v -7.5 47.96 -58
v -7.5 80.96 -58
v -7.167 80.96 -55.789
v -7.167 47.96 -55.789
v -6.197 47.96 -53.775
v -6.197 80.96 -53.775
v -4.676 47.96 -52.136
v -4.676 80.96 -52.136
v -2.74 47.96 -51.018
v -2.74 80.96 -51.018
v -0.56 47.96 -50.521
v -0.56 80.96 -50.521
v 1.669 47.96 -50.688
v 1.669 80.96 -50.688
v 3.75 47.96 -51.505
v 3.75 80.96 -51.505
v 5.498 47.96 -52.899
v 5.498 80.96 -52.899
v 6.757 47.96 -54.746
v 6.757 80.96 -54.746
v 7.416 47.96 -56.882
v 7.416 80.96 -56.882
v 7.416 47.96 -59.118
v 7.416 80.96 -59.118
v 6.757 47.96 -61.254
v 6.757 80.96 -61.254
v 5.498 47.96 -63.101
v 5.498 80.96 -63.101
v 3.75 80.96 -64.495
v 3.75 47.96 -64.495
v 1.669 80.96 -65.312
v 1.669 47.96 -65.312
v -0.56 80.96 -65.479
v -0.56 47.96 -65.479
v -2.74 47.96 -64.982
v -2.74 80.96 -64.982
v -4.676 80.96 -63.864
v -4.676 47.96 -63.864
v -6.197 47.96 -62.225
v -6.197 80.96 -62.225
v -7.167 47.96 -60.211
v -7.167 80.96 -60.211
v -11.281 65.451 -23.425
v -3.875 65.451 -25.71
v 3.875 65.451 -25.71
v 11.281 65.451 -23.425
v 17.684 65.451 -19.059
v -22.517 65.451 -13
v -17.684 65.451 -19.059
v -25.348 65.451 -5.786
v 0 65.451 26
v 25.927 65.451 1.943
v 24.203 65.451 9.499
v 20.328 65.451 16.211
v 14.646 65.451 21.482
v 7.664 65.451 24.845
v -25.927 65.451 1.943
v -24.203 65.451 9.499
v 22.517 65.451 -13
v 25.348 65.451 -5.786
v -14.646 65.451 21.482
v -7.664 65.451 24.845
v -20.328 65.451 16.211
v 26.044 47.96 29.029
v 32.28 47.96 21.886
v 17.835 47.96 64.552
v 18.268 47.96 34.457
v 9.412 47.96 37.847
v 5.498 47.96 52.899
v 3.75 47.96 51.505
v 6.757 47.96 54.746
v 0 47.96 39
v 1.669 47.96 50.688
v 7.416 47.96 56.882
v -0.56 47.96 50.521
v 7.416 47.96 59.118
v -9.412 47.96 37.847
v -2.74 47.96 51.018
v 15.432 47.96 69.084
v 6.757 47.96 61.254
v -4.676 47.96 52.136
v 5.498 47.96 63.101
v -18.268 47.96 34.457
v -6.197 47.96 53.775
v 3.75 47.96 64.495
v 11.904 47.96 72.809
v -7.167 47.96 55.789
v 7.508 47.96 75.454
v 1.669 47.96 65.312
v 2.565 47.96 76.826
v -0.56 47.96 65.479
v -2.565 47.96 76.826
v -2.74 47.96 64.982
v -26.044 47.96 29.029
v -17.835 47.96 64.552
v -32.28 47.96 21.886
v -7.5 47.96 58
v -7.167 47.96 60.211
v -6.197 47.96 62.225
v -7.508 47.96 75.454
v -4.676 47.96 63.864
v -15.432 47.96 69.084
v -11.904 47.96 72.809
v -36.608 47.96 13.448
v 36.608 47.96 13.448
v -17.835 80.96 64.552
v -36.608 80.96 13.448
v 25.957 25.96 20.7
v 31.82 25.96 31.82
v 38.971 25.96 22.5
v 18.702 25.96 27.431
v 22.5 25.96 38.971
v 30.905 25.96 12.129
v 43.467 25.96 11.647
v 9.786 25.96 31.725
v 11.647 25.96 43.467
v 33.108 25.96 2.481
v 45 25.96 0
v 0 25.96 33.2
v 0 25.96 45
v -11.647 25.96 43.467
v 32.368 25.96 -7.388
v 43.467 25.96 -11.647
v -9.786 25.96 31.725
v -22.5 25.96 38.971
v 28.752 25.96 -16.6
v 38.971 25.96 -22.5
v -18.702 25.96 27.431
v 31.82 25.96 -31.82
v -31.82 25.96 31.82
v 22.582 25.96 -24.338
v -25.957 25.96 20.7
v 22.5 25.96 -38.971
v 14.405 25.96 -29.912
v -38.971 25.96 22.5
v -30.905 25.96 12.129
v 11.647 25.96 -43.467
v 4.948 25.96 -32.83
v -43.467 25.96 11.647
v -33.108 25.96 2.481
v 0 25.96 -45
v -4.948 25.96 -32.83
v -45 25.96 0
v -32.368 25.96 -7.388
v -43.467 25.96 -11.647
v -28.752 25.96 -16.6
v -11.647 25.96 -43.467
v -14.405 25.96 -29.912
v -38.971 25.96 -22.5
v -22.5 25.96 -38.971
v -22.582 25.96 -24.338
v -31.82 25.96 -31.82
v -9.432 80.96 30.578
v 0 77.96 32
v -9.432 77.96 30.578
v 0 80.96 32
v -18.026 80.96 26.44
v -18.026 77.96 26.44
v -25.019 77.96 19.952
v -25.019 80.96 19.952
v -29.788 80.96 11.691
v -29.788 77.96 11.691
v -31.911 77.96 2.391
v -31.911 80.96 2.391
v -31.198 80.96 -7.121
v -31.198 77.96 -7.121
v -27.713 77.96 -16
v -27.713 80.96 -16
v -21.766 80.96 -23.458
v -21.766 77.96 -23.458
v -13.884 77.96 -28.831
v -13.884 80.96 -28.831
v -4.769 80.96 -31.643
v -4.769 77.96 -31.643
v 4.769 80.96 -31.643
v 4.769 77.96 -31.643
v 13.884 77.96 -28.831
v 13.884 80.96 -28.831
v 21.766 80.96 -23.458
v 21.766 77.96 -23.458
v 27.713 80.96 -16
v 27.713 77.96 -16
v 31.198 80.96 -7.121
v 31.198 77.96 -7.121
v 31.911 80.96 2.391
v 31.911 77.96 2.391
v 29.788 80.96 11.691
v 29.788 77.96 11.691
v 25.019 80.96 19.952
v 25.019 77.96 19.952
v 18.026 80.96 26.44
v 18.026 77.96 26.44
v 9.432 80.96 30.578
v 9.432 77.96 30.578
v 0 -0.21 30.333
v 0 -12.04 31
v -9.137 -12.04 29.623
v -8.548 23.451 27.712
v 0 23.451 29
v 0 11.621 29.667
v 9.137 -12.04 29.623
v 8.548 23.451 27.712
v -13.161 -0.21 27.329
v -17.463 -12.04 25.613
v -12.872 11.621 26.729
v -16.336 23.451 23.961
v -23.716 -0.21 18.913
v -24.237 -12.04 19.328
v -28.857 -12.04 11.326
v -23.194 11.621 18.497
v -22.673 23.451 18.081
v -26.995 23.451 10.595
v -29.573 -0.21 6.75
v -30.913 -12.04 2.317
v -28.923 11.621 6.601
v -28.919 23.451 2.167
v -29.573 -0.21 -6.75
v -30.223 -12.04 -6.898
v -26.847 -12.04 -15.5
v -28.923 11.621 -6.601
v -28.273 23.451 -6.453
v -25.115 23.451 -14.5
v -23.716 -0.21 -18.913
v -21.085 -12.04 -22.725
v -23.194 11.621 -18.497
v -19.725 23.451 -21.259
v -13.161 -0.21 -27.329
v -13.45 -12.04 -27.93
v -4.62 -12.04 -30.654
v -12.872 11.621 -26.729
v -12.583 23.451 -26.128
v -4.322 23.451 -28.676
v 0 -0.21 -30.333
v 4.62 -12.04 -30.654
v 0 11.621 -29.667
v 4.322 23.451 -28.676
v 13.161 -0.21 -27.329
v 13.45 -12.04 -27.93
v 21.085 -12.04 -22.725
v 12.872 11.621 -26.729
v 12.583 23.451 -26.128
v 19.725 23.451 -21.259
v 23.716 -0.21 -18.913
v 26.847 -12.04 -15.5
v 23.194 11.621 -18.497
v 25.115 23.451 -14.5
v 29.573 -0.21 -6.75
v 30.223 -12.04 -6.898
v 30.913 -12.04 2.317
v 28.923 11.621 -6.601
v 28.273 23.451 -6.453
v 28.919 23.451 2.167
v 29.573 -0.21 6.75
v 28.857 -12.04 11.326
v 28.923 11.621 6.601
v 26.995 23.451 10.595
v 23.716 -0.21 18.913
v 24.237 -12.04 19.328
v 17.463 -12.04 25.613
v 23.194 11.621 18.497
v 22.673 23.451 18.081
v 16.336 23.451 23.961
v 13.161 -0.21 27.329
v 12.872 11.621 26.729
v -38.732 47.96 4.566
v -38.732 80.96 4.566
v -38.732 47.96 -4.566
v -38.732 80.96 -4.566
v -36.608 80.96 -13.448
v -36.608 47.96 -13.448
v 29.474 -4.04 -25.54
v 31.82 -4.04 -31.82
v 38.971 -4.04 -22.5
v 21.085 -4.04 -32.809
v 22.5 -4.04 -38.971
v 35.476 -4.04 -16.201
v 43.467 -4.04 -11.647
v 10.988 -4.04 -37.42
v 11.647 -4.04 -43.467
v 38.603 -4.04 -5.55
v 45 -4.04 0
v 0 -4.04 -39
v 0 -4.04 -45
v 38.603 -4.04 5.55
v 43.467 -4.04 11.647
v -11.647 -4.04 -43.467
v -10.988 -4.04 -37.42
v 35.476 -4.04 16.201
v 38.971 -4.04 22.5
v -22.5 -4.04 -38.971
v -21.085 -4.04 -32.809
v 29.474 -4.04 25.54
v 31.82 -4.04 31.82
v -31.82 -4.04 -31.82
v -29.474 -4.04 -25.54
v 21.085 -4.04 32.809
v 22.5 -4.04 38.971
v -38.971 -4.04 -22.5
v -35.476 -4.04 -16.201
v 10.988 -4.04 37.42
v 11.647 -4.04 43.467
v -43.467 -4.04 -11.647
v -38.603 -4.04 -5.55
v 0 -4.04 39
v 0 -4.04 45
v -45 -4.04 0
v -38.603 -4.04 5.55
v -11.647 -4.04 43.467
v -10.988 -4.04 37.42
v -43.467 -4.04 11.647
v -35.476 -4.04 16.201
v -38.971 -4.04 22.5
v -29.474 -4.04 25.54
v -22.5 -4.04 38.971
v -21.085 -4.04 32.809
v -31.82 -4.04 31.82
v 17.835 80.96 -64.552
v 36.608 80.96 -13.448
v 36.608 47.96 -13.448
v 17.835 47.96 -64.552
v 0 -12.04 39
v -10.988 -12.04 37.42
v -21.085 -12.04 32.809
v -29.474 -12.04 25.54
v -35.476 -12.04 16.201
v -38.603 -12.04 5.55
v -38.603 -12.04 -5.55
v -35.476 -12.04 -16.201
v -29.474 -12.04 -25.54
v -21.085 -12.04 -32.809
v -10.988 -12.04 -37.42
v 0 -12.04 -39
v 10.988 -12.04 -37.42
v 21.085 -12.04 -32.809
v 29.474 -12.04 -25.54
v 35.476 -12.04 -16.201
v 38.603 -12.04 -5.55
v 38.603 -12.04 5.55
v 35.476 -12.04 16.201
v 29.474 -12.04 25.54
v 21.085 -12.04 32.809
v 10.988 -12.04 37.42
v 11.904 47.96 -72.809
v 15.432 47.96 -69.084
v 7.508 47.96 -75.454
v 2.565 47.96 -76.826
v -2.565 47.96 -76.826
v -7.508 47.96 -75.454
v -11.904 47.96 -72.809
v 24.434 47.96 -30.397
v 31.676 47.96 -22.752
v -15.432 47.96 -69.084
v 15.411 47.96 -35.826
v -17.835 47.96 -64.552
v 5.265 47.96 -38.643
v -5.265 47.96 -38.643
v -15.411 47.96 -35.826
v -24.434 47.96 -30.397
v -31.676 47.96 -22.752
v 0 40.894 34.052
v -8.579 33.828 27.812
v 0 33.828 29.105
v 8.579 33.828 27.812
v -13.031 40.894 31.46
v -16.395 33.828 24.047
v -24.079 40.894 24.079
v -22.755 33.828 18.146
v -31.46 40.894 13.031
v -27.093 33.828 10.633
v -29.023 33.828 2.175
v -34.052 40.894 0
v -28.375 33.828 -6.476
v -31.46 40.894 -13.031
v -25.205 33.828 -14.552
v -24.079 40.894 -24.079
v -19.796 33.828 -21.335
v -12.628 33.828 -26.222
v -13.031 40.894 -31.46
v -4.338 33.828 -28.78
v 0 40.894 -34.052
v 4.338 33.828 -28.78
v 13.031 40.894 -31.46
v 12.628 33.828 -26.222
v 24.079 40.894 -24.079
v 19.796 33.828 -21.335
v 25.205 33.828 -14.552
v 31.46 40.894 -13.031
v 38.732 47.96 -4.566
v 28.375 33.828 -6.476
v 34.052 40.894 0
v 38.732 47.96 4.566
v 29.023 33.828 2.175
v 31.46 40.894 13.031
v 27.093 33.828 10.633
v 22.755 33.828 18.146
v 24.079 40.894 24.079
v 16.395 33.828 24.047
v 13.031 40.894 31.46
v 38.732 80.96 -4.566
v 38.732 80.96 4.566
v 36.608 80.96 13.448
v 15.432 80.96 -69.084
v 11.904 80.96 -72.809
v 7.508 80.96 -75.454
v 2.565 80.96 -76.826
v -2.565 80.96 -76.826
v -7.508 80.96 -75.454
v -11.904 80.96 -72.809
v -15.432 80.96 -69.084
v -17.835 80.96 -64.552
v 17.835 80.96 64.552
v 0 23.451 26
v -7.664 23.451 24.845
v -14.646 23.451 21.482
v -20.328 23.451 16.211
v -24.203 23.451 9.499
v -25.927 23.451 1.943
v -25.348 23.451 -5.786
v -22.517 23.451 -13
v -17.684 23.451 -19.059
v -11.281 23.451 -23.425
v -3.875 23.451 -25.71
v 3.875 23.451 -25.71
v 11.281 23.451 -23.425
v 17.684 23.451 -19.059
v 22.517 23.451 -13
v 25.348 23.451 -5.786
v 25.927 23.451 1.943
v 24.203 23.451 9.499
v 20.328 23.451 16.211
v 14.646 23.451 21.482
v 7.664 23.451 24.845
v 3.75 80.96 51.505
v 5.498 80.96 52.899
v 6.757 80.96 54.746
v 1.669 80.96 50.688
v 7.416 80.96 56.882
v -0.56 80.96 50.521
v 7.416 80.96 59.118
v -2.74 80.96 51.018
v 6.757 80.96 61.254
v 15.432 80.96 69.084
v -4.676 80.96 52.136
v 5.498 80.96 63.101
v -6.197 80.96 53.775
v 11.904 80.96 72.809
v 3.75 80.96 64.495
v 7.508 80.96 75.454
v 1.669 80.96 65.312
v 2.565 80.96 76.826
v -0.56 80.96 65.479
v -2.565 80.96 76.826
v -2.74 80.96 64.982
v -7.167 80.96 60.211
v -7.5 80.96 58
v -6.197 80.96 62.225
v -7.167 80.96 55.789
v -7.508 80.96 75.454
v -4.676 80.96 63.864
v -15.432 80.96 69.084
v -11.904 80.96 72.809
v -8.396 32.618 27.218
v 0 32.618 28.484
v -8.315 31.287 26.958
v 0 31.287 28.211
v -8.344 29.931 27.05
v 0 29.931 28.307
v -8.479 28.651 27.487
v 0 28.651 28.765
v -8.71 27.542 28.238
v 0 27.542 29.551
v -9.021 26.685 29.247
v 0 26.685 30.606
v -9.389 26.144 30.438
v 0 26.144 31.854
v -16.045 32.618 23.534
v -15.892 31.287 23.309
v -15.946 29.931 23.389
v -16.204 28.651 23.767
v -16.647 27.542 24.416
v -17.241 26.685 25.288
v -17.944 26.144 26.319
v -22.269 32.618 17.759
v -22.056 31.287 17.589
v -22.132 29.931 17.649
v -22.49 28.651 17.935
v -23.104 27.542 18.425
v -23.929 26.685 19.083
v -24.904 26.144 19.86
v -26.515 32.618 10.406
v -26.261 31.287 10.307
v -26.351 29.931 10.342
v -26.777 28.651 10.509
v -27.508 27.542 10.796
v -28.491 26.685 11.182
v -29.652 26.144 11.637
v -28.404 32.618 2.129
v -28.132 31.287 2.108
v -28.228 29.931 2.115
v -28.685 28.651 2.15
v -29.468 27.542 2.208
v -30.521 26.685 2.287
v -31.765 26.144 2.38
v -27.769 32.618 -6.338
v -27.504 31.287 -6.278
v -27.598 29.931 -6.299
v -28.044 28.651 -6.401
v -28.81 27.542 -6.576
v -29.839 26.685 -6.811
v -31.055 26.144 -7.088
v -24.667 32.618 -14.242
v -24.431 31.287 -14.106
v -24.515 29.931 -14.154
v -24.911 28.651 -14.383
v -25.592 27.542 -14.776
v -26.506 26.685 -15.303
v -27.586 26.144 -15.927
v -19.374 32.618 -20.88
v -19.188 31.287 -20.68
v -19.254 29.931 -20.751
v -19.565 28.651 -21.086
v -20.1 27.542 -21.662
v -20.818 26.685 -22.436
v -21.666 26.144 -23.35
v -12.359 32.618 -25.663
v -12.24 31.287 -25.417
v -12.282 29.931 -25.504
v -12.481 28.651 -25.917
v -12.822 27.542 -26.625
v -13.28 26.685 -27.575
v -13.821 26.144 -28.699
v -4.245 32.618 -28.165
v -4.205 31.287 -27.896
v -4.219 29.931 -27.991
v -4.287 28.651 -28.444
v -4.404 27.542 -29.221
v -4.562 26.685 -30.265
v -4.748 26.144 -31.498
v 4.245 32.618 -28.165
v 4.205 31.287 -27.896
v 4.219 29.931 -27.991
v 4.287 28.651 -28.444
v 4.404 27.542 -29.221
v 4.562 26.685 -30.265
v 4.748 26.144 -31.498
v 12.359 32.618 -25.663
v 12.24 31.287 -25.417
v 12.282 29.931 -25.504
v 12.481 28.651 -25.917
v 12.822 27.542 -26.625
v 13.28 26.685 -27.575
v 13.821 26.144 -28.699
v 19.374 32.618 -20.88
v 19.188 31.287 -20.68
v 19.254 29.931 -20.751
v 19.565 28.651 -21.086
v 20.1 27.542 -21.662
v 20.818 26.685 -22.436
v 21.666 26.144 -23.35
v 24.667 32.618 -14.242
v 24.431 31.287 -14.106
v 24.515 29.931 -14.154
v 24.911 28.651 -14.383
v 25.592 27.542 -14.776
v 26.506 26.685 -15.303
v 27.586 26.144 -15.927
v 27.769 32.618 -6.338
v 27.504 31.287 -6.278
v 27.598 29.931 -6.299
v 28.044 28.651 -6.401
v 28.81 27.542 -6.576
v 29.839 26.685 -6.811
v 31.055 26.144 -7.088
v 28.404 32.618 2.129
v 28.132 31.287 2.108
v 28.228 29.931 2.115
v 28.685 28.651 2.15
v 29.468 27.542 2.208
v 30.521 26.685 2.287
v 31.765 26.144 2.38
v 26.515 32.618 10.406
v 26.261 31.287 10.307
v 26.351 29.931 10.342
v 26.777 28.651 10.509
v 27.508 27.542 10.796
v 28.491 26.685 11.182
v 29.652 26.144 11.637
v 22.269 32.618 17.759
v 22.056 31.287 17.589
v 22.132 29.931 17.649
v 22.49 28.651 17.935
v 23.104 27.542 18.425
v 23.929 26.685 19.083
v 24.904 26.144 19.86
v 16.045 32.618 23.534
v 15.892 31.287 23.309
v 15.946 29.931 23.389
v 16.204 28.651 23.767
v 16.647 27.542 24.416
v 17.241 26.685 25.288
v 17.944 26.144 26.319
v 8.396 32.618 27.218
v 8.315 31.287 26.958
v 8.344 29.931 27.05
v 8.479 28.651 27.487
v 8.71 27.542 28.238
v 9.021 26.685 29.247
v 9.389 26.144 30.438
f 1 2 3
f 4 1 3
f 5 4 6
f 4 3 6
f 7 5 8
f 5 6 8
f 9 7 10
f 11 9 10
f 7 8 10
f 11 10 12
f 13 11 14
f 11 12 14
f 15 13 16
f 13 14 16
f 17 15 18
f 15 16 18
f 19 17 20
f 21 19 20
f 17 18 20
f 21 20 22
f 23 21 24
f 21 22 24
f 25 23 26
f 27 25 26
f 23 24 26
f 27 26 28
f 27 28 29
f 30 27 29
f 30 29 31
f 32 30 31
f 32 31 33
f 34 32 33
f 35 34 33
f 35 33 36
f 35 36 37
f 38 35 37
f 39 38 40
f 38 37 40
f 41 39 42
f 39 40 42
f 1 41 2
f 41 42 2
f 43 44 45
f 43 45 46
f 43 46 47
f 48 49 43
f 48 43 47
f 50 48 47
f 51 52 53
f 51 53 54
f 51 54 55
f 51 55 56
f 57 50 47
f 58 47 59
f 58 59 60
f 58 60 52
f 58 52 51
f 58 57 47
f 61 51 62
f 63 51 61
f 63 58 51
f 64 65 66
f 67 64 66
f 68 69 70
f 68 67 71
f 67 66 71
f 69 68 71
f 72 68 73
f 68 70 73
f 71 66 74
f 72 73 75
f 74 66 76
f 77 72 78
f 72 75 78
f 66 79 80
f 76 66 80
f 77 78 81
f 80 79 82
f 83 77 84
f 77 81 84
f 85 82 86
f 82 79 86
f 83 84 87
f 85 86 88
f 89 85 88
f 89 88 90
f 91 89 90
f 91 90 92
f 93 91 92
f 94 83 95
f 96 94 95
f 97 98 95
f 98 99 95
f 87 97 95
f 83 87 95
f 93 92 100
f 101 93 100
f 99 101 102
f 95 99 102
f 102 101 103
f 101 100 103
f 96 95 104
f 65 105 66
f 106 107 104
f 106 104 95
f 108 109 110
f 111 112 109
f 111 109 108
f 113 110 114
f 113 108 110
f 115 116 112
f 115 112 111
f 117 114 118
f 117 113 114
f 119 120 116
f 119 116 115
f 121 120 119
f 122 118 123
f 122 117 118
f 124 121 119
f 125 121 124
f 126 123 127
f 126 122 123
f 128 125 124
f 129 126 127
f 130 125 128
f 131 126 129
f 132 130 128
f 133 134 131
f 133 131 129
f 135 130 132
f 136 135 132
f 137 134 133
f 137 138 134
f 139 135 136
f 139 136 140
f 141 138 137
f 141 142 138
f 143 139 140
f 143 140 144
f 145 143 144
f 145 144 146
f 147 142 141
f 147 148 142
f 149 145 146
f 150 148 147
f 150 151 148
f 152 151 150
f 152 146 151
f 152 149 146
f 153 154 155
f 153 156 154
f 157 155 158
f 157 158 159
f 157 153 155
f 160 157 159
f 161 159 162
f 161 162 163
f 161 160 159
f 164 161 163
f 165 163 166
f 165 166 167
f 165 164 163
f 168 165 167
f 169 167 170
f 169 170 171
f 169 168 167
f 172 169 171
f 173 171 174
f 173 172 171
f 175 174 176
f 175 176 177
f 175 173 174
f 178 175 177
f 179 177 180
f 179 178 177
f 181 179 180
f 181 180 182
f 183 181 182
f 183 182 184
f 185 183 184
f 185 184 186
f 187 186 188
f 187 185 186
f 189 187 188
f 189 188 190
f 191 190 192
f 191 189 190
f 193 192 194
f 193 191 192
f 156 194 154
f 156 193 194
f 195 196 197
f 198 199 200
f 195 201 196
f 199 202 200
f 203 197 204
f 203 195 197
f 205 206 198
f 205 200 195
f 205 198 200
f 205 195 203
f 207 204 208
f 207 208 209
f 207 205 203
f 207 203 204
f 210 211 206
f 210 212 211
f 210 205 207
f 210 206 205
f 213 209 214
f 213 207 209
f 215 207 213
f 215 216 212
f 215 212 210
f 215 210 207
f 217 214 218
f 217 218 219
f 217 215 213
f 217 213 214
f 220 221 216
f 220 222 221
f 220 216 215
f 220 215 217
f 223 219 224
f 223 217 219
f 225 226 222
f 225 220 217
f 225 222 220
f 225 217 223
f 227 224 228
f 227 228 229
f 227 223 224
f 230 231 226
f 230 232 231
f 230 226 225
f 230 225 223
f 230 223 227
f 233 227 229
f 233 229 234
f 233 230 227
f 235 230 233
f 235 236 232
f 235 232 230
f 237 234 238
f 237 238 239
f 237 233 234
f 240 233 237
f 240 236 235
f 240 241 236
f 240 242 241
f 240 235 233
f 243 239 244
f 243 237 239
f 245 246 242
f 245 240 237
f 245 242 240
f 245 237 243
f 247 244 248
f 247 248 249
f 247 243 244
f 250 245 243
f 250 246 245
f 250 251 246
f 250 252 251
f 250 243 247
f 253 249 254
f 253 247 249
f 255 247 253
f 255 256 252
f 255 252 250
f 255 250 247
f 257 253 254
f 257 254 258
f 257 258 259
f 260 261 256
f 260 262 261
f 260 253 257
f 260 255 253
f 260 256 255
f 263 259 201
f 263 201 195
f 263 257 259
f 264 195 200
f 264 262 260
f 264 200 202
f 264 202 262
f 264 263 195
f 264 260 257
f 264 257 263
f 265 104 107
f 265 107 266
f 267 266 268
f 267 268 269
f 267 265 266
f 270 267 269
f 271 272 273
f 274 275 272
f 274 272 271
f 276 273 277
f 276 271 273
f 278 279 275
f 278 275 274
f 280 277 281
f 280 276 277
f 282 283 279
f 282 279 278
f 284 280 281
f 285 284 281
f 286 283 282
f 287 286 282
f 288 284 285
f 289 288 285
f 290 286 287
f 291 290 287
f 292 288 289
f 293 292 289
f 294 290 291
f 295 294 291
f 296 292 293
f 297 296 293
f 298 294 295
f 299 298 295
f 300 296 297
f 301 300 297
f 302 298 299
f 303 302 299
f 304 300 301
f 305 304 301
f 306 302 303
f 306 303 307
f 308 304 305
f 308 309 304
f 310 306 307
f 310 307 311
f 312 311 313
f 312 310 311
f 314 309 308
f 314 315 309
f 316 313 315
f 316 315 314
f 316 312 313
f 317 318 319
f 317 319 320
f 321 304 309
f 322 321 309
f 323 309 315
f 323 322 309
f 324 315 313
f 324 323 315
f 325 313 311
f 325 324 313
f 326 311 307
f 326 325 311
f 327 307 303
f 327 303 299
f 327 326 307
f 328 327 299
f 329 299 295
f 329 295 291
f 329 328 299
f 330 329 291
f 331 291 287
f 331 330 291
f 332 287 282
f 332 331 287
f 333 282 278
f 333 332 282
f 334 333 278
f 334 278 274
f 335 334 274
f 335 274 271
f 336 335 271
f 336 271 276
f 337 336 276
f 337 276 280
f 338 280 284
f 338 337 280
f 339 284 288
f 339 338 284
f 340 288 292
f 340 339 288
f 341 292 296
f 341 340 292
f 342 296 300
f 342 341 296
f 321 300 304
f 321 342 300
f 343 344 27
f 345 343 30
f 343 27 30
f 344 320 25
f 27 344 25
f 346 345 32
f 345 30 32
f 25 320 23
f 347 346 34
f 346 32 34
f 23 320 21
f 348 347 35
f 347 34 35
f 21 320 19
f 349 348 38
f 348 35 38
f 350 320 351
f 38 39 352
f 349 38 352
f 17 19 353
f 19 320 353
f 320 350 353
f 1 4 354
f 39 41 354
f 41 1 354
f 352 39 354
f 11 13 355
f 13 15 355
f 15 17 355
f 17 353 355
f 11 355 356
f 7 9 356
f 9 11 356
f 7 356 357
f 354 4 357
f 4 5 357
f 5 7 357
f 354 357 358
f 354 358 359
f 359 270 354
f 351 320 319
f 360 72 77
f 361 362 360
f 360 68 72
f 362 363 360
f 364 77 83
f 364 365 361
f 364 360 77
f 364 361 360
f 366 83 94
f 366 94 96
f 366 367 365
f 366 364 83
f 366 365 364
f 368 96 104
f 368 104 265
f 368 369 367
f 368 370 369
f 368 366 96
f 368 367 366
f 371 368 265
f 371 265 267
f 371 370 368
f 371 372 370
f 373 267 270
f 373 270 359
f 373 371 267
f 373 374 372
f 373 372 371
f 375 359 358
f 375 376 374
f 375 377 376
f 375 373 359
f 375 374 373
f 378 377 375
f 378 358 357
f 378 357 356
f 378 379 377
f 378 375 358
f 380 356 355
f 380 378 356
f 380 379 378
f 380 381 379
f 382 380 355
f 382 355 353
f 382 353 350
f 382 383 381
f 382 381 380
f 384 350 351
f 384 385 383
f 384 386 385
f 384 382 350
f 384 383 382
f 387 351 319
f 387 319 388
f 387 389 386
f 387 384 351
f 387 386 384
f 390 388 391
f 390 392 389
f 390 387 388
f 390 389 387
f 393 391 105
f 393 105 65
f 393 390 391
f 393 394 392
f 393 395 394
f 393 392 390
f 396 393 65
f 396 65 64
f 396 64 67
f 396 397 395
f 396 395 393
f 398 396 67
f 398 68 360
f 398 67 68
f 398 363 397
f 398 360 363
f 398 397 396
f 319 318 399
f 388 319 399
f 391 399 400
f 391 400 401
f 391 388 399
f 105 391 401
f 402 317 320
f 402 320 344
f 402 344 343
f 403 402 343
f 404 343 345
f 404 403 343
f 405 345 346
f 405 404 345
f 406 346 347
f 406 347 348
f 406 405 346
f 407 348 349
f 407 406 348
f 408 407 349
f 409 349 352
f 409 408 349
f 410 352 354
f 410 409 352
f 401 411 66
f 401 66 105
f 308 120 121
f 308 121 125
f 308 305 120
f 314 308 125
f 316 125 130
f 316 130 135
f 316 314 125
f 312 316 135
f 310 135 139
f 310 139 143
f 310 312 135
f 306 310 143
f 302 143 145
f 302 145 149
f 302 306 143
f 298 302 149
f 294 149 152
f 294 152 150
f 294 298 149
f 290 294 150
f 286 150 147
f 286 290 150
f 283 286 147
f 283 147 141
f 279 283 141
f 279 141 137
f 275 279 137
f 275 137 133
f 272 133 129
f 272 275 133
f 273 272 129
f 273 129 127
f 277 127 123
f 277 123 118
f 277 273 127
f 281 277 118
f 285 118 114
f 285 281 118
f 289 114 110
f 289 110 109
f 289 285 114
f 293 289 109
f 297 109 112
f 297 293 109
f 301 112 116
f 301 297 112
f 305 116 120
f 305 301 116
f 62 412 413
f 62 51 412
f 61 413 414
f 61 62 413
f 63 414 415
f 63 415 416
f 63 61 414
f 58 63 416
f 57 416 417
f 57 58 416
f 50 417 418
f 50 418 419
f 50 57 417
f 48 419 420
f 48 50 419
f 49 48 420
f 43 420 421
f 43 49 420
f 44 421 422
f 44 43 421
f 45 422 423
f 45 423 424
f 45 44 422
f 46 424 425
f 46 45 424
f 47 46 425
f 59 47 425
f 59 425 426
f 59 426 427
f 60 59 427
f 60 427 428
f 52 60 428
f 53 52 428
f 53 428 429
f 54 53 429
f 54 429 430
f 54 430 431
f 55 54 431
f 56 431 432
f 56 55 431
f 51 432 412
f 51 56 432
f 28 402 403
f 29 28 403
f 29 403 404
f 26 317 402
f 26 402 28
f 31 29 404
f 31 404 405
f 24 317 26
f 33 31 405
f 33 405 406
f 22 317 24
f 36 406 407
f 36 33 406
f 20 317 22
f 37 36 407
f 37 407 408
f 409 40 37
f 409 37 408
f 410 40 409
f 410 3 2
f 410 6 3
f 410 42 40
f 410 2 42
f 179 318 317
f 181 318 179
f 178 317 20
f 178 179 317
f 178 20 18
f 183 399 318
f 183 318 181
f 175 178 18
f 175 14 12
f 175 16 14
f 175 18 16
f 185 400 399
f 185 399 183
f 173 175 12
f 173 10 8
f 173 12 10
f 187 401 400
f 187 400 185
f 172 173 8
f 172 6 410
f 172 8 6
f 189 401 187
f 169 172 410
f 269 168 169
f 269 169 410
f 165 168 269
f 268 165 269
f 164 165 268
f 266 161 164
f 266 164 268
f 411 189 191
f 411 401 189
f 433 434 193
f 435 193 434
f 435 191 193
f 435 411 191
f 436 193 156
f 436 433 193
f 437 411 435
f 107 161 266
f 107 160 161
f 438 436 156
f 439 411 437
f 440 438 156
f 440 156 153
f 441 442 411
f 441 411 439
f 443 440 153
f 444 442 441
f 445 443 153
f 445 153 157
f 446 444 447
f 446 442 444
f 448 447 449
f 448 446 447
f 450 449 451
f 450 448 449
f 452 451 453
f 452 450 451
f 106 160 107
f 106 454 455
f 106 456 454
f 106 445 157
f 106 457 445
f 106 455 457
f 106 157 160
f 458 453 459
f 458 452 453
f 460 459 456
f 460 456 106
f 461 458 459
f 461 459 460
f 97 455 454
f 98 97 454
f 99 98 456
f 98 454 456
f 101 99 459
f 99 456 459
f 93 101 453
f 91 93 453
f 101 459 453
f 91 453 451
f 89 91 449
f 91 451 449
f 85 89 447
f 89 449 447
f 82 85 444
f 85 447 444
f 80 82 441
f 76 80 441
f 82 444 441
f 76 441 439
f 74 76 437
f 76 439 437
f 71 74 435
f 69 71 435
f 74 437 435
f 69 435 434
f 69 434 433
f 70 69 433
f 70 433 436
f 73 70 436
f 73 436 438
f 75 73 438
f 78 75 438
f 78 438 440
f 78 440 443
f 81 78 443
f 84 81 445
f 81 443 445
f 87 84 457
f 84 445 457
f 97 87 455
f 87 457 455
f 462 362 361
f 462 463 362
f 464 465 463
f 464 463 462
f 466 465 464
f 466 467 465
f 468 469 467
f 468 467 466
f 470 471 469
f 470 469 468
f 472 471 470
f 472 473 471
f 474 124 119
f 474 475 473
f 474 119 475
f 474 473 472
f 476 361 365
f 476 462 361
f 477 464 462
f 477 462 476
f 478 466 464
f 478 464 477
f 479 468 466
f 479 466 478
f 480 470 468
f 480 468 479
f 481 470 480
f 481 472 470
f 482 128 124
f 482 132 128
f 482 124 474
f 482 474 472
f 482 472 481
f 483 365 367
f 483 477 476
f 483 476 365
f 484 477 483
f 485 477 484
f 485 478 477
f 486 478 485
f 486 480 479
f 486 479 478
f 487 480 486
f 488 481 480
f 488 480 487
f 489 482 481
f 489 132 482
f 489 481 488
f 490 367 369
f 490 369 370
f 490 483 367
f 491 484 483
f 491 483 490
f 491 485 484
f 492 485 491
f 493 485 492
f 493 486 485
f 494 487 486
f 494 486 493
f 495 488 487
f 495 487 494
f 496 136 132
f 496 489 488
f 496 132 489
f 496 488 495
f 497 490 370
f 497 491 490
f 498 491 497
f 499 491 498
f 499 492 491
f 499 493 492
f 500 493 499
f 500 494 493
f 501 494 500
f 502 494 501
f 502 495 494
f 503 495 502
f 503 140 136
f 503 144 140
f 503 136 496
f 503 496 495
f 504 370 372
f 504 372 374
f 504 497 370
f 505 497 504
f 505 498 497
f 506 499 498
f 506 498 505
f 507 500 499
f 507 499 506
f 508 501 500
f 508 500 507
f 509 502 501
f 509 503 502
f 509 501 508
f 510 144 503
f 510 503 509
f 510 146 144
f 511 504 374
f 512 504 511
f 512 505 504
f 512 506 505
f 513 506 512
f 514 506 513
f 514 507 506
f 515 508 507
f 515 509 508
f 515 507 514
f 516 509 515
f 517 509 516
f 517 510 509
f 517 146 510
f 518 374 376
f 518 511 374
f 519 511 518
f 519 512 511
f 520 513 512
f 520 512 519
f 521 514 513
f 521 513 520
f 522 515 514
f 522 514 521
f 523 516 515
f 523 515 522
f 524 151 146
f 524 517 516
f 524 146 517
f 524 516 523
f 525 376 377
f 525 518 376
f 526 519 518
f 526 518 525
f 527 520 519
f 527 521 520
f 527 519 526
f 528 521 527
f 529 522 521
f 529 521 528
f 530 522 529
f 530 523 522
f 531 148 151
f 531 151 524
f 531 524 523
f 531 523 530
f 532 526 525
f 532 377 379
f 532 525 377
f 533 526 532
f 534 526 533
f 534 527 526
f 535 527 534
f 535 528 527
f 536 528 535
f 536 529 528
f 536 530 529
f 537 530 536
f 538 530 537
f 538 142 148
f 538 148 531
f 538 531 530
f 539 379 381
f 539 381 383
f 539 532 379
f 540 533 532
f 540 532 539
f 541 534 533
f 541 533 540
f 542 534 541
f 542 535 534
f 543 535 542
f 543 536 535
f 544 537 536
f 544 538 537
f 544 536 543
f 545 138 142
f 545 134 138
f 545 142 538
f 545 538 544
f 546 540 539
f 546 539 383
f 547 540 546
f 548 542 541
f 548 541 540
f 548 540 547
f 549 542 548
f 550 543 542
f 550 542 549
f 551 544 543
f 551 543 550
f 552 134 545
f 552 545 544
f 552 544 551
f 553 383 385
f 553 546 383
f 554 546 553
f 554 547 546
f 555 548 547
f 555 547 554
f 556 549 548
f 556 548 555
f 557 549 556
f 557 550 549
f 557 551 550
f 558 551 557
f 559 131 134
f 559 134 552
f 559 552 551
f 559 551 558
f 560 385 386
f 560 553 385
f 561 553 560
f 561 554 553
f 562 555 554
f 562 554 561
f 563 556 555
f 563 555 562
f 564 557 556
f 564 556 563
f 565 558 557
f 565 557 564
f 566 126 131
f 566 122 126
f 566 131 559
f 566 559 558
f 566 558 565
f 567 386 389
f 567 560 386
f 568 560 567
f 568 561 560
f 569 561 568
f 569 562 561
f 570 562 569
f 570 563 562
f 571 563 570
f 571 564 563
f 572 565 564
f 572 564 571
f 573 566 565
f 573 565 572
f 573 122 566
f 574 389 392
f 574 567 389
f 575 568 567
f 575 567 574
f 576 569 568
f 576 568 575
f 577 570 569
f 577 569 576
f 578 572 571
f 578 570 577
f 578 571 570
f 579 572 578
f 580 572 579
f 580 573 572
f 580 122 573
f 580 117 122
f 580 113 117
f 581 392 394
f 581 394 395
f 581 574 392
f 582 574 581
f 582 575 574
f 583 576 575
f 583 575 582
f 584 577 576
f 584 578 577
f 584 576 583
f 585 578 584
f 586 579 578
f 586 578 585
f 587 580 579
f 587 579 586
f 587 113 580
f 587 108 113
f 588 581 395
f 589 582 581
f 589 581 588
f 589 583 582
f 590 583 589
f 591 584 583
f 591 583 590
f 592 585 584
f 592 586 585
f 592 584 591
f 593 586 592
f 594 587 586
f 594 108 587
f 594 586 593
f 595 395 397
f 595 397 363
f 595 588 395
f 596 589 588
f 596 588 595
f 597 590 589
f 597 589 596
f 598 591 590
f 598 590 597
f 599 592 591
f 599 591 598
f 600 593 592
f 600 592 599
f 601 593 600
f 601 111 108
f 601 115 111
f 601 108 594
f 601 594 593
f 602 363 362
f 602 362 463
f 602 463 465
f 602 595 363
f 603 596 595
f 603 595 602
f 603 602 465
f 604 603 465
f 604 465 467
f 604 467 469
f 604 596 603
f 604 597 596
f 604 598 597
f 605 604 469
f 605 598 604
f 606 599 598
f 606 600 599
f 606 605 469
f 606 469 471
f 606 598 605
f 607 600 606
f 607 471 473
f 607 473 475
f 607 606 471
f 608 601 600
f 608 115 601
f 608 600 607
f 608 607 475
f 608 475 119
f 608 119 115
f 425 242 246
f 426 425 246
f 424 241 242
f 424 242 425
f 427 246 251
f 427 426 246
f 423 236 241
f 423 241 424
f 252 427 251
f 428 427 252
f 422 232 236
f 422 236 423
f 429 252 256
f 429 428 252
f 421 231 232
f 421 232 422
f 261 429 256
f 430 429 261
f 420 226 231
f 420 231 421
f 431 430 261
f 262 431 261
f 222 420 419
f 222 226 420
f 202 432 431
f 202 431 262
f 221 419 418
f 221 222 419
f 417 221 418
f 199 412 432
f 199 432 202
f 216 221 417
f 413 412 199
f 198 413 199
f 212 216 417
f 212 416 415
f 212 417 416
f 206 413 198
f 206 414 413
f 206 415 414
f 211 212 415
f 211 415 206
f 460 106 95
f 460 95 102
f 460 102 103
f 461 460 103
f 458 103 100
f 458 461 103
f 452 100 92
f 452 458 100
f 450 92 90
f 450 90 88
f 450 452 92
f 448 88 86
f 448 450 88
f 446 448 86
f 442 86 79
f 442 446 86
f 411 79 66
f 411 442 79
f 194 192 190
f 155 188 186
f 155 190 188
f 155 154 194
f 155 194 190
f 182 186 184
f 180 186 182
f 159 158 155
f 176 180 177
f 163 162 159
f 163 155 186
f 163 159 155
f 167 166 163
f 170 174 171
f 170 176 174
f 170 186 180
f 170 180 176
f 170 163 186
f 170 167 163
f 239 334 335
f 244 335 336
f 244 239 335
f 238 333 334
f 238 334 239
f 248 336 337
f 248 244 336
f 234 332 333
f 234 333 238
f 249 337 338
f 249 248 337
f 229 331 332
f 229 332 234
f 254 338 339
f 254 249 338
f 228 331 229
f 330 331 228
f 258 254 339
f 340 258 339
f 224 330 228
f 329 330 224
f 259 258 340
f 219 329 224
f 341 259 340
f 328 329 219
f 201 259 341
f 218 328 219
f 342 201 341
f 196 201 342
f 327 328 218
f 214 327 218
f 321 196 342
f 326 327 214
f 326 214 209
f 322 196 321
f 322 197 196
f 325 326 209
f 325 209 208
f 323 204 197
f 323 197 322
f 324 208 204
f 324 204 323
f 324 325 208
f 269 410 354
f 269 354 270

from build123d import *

# Parameters (mm, degrees)
F2_R     = 7.5
F3_DEPTH = 33


with BuildPart() as f1:
    # F0 (on Right) → F1 (revolve)
    with BuildSketch(Plane.YZ):
        with BuildLine():
            Line((-12.0403646417, 39), (-12.0403646417, 31))
            Line((-12.0403646417, 31), (23.4514921904, 29))
            Line((23.4514921904, 29), (23.4514921904, 26))
            Line((23.4514921904, 26), (65.4514921904, 26))
            Line((65.4514921904, 26), (65.4514921904, 0))
            Line((65.4514921904, 0), (77.9596353583, 0))
            Line((77.9596353583, 0), (77.9596353583, 32))
            Line((77.9596353583, 32), (80.9596353583, 32))
            Line((80.9596353583, 32), (80.9596353583, 39))
            Line((80.9596353583, 39), (47.9596353583, 39))
            Line((47.9596353583, 39), (33.8275175401, 29.1045845728))
            ThreePointArc((33.8275175401, 29.1045845728), (28.6508922921, 28.7652906284), (25.9596353583, 33.2003447942))
            Line((25.9596353583, 33.2003447942), (25.9596353583, 39))
            Line((25.9596353583, 39), (25.9596353583, 45))
            Line((25.9596353583, 45), (-4.0403646417, 45))
            Line((-4.0403646417, 45), (-4.0403646417, 39))
            Line((-4.0403646417, 39), (-12.0403646417, 39))
        make_face()
    revolve(axis=Axis((0, 71.7055637743, 0), (0, -1, 0)))

    # F2 (on face) → F3 (join)
    with BuildSketch(Plane(origin=(0, 80.9596353583, 0), x_dir=(-1, 0, 0), z_dir=(0, 1, 0))):
        with BuildLine():
            Line((36.6079755837, 13.4482758621), (17.8346547716, 64.5517241379))
            ThreePointArc((17.8346547716, 64.5517241379), (0, 77), (-17.8346547716, 64.5517241379))
            Line((-17.8346547716, 64.5517241379), (-36.6079755837, 13.4482758621))
            ThreePointArc((-36.6079755837, 13.4482758621), (0, 39), (36.6079755837, 13.4482758621))
        make_face()
        with Locations((0, 58)):
            Circle(F2_R, mode=Mode.SUBTRACT)
        with BuildLine():
            Line((17.8346547716, -64.5517241379), (36.6079755837, -13.4482758621))
            ThreePointArc((36.6079755837, -13.4482758621), (0, -39), (-36.6079755837, -13.4482758621))
            Line((-36.6079755837, -13.4482758621), (-17.8346547716, -64.5517241379))
            ThreePointArc((-17.8346547716, -64.5517241379), (0, -77), (17.8346547716, -64.5517241379))
        make_face()
        with Locations((0, -58)):
            Circle(F2_R, mode=Mode.SUBTRACT)
    extrude(amount=-F3_DEPTH)


solid = f1.part
